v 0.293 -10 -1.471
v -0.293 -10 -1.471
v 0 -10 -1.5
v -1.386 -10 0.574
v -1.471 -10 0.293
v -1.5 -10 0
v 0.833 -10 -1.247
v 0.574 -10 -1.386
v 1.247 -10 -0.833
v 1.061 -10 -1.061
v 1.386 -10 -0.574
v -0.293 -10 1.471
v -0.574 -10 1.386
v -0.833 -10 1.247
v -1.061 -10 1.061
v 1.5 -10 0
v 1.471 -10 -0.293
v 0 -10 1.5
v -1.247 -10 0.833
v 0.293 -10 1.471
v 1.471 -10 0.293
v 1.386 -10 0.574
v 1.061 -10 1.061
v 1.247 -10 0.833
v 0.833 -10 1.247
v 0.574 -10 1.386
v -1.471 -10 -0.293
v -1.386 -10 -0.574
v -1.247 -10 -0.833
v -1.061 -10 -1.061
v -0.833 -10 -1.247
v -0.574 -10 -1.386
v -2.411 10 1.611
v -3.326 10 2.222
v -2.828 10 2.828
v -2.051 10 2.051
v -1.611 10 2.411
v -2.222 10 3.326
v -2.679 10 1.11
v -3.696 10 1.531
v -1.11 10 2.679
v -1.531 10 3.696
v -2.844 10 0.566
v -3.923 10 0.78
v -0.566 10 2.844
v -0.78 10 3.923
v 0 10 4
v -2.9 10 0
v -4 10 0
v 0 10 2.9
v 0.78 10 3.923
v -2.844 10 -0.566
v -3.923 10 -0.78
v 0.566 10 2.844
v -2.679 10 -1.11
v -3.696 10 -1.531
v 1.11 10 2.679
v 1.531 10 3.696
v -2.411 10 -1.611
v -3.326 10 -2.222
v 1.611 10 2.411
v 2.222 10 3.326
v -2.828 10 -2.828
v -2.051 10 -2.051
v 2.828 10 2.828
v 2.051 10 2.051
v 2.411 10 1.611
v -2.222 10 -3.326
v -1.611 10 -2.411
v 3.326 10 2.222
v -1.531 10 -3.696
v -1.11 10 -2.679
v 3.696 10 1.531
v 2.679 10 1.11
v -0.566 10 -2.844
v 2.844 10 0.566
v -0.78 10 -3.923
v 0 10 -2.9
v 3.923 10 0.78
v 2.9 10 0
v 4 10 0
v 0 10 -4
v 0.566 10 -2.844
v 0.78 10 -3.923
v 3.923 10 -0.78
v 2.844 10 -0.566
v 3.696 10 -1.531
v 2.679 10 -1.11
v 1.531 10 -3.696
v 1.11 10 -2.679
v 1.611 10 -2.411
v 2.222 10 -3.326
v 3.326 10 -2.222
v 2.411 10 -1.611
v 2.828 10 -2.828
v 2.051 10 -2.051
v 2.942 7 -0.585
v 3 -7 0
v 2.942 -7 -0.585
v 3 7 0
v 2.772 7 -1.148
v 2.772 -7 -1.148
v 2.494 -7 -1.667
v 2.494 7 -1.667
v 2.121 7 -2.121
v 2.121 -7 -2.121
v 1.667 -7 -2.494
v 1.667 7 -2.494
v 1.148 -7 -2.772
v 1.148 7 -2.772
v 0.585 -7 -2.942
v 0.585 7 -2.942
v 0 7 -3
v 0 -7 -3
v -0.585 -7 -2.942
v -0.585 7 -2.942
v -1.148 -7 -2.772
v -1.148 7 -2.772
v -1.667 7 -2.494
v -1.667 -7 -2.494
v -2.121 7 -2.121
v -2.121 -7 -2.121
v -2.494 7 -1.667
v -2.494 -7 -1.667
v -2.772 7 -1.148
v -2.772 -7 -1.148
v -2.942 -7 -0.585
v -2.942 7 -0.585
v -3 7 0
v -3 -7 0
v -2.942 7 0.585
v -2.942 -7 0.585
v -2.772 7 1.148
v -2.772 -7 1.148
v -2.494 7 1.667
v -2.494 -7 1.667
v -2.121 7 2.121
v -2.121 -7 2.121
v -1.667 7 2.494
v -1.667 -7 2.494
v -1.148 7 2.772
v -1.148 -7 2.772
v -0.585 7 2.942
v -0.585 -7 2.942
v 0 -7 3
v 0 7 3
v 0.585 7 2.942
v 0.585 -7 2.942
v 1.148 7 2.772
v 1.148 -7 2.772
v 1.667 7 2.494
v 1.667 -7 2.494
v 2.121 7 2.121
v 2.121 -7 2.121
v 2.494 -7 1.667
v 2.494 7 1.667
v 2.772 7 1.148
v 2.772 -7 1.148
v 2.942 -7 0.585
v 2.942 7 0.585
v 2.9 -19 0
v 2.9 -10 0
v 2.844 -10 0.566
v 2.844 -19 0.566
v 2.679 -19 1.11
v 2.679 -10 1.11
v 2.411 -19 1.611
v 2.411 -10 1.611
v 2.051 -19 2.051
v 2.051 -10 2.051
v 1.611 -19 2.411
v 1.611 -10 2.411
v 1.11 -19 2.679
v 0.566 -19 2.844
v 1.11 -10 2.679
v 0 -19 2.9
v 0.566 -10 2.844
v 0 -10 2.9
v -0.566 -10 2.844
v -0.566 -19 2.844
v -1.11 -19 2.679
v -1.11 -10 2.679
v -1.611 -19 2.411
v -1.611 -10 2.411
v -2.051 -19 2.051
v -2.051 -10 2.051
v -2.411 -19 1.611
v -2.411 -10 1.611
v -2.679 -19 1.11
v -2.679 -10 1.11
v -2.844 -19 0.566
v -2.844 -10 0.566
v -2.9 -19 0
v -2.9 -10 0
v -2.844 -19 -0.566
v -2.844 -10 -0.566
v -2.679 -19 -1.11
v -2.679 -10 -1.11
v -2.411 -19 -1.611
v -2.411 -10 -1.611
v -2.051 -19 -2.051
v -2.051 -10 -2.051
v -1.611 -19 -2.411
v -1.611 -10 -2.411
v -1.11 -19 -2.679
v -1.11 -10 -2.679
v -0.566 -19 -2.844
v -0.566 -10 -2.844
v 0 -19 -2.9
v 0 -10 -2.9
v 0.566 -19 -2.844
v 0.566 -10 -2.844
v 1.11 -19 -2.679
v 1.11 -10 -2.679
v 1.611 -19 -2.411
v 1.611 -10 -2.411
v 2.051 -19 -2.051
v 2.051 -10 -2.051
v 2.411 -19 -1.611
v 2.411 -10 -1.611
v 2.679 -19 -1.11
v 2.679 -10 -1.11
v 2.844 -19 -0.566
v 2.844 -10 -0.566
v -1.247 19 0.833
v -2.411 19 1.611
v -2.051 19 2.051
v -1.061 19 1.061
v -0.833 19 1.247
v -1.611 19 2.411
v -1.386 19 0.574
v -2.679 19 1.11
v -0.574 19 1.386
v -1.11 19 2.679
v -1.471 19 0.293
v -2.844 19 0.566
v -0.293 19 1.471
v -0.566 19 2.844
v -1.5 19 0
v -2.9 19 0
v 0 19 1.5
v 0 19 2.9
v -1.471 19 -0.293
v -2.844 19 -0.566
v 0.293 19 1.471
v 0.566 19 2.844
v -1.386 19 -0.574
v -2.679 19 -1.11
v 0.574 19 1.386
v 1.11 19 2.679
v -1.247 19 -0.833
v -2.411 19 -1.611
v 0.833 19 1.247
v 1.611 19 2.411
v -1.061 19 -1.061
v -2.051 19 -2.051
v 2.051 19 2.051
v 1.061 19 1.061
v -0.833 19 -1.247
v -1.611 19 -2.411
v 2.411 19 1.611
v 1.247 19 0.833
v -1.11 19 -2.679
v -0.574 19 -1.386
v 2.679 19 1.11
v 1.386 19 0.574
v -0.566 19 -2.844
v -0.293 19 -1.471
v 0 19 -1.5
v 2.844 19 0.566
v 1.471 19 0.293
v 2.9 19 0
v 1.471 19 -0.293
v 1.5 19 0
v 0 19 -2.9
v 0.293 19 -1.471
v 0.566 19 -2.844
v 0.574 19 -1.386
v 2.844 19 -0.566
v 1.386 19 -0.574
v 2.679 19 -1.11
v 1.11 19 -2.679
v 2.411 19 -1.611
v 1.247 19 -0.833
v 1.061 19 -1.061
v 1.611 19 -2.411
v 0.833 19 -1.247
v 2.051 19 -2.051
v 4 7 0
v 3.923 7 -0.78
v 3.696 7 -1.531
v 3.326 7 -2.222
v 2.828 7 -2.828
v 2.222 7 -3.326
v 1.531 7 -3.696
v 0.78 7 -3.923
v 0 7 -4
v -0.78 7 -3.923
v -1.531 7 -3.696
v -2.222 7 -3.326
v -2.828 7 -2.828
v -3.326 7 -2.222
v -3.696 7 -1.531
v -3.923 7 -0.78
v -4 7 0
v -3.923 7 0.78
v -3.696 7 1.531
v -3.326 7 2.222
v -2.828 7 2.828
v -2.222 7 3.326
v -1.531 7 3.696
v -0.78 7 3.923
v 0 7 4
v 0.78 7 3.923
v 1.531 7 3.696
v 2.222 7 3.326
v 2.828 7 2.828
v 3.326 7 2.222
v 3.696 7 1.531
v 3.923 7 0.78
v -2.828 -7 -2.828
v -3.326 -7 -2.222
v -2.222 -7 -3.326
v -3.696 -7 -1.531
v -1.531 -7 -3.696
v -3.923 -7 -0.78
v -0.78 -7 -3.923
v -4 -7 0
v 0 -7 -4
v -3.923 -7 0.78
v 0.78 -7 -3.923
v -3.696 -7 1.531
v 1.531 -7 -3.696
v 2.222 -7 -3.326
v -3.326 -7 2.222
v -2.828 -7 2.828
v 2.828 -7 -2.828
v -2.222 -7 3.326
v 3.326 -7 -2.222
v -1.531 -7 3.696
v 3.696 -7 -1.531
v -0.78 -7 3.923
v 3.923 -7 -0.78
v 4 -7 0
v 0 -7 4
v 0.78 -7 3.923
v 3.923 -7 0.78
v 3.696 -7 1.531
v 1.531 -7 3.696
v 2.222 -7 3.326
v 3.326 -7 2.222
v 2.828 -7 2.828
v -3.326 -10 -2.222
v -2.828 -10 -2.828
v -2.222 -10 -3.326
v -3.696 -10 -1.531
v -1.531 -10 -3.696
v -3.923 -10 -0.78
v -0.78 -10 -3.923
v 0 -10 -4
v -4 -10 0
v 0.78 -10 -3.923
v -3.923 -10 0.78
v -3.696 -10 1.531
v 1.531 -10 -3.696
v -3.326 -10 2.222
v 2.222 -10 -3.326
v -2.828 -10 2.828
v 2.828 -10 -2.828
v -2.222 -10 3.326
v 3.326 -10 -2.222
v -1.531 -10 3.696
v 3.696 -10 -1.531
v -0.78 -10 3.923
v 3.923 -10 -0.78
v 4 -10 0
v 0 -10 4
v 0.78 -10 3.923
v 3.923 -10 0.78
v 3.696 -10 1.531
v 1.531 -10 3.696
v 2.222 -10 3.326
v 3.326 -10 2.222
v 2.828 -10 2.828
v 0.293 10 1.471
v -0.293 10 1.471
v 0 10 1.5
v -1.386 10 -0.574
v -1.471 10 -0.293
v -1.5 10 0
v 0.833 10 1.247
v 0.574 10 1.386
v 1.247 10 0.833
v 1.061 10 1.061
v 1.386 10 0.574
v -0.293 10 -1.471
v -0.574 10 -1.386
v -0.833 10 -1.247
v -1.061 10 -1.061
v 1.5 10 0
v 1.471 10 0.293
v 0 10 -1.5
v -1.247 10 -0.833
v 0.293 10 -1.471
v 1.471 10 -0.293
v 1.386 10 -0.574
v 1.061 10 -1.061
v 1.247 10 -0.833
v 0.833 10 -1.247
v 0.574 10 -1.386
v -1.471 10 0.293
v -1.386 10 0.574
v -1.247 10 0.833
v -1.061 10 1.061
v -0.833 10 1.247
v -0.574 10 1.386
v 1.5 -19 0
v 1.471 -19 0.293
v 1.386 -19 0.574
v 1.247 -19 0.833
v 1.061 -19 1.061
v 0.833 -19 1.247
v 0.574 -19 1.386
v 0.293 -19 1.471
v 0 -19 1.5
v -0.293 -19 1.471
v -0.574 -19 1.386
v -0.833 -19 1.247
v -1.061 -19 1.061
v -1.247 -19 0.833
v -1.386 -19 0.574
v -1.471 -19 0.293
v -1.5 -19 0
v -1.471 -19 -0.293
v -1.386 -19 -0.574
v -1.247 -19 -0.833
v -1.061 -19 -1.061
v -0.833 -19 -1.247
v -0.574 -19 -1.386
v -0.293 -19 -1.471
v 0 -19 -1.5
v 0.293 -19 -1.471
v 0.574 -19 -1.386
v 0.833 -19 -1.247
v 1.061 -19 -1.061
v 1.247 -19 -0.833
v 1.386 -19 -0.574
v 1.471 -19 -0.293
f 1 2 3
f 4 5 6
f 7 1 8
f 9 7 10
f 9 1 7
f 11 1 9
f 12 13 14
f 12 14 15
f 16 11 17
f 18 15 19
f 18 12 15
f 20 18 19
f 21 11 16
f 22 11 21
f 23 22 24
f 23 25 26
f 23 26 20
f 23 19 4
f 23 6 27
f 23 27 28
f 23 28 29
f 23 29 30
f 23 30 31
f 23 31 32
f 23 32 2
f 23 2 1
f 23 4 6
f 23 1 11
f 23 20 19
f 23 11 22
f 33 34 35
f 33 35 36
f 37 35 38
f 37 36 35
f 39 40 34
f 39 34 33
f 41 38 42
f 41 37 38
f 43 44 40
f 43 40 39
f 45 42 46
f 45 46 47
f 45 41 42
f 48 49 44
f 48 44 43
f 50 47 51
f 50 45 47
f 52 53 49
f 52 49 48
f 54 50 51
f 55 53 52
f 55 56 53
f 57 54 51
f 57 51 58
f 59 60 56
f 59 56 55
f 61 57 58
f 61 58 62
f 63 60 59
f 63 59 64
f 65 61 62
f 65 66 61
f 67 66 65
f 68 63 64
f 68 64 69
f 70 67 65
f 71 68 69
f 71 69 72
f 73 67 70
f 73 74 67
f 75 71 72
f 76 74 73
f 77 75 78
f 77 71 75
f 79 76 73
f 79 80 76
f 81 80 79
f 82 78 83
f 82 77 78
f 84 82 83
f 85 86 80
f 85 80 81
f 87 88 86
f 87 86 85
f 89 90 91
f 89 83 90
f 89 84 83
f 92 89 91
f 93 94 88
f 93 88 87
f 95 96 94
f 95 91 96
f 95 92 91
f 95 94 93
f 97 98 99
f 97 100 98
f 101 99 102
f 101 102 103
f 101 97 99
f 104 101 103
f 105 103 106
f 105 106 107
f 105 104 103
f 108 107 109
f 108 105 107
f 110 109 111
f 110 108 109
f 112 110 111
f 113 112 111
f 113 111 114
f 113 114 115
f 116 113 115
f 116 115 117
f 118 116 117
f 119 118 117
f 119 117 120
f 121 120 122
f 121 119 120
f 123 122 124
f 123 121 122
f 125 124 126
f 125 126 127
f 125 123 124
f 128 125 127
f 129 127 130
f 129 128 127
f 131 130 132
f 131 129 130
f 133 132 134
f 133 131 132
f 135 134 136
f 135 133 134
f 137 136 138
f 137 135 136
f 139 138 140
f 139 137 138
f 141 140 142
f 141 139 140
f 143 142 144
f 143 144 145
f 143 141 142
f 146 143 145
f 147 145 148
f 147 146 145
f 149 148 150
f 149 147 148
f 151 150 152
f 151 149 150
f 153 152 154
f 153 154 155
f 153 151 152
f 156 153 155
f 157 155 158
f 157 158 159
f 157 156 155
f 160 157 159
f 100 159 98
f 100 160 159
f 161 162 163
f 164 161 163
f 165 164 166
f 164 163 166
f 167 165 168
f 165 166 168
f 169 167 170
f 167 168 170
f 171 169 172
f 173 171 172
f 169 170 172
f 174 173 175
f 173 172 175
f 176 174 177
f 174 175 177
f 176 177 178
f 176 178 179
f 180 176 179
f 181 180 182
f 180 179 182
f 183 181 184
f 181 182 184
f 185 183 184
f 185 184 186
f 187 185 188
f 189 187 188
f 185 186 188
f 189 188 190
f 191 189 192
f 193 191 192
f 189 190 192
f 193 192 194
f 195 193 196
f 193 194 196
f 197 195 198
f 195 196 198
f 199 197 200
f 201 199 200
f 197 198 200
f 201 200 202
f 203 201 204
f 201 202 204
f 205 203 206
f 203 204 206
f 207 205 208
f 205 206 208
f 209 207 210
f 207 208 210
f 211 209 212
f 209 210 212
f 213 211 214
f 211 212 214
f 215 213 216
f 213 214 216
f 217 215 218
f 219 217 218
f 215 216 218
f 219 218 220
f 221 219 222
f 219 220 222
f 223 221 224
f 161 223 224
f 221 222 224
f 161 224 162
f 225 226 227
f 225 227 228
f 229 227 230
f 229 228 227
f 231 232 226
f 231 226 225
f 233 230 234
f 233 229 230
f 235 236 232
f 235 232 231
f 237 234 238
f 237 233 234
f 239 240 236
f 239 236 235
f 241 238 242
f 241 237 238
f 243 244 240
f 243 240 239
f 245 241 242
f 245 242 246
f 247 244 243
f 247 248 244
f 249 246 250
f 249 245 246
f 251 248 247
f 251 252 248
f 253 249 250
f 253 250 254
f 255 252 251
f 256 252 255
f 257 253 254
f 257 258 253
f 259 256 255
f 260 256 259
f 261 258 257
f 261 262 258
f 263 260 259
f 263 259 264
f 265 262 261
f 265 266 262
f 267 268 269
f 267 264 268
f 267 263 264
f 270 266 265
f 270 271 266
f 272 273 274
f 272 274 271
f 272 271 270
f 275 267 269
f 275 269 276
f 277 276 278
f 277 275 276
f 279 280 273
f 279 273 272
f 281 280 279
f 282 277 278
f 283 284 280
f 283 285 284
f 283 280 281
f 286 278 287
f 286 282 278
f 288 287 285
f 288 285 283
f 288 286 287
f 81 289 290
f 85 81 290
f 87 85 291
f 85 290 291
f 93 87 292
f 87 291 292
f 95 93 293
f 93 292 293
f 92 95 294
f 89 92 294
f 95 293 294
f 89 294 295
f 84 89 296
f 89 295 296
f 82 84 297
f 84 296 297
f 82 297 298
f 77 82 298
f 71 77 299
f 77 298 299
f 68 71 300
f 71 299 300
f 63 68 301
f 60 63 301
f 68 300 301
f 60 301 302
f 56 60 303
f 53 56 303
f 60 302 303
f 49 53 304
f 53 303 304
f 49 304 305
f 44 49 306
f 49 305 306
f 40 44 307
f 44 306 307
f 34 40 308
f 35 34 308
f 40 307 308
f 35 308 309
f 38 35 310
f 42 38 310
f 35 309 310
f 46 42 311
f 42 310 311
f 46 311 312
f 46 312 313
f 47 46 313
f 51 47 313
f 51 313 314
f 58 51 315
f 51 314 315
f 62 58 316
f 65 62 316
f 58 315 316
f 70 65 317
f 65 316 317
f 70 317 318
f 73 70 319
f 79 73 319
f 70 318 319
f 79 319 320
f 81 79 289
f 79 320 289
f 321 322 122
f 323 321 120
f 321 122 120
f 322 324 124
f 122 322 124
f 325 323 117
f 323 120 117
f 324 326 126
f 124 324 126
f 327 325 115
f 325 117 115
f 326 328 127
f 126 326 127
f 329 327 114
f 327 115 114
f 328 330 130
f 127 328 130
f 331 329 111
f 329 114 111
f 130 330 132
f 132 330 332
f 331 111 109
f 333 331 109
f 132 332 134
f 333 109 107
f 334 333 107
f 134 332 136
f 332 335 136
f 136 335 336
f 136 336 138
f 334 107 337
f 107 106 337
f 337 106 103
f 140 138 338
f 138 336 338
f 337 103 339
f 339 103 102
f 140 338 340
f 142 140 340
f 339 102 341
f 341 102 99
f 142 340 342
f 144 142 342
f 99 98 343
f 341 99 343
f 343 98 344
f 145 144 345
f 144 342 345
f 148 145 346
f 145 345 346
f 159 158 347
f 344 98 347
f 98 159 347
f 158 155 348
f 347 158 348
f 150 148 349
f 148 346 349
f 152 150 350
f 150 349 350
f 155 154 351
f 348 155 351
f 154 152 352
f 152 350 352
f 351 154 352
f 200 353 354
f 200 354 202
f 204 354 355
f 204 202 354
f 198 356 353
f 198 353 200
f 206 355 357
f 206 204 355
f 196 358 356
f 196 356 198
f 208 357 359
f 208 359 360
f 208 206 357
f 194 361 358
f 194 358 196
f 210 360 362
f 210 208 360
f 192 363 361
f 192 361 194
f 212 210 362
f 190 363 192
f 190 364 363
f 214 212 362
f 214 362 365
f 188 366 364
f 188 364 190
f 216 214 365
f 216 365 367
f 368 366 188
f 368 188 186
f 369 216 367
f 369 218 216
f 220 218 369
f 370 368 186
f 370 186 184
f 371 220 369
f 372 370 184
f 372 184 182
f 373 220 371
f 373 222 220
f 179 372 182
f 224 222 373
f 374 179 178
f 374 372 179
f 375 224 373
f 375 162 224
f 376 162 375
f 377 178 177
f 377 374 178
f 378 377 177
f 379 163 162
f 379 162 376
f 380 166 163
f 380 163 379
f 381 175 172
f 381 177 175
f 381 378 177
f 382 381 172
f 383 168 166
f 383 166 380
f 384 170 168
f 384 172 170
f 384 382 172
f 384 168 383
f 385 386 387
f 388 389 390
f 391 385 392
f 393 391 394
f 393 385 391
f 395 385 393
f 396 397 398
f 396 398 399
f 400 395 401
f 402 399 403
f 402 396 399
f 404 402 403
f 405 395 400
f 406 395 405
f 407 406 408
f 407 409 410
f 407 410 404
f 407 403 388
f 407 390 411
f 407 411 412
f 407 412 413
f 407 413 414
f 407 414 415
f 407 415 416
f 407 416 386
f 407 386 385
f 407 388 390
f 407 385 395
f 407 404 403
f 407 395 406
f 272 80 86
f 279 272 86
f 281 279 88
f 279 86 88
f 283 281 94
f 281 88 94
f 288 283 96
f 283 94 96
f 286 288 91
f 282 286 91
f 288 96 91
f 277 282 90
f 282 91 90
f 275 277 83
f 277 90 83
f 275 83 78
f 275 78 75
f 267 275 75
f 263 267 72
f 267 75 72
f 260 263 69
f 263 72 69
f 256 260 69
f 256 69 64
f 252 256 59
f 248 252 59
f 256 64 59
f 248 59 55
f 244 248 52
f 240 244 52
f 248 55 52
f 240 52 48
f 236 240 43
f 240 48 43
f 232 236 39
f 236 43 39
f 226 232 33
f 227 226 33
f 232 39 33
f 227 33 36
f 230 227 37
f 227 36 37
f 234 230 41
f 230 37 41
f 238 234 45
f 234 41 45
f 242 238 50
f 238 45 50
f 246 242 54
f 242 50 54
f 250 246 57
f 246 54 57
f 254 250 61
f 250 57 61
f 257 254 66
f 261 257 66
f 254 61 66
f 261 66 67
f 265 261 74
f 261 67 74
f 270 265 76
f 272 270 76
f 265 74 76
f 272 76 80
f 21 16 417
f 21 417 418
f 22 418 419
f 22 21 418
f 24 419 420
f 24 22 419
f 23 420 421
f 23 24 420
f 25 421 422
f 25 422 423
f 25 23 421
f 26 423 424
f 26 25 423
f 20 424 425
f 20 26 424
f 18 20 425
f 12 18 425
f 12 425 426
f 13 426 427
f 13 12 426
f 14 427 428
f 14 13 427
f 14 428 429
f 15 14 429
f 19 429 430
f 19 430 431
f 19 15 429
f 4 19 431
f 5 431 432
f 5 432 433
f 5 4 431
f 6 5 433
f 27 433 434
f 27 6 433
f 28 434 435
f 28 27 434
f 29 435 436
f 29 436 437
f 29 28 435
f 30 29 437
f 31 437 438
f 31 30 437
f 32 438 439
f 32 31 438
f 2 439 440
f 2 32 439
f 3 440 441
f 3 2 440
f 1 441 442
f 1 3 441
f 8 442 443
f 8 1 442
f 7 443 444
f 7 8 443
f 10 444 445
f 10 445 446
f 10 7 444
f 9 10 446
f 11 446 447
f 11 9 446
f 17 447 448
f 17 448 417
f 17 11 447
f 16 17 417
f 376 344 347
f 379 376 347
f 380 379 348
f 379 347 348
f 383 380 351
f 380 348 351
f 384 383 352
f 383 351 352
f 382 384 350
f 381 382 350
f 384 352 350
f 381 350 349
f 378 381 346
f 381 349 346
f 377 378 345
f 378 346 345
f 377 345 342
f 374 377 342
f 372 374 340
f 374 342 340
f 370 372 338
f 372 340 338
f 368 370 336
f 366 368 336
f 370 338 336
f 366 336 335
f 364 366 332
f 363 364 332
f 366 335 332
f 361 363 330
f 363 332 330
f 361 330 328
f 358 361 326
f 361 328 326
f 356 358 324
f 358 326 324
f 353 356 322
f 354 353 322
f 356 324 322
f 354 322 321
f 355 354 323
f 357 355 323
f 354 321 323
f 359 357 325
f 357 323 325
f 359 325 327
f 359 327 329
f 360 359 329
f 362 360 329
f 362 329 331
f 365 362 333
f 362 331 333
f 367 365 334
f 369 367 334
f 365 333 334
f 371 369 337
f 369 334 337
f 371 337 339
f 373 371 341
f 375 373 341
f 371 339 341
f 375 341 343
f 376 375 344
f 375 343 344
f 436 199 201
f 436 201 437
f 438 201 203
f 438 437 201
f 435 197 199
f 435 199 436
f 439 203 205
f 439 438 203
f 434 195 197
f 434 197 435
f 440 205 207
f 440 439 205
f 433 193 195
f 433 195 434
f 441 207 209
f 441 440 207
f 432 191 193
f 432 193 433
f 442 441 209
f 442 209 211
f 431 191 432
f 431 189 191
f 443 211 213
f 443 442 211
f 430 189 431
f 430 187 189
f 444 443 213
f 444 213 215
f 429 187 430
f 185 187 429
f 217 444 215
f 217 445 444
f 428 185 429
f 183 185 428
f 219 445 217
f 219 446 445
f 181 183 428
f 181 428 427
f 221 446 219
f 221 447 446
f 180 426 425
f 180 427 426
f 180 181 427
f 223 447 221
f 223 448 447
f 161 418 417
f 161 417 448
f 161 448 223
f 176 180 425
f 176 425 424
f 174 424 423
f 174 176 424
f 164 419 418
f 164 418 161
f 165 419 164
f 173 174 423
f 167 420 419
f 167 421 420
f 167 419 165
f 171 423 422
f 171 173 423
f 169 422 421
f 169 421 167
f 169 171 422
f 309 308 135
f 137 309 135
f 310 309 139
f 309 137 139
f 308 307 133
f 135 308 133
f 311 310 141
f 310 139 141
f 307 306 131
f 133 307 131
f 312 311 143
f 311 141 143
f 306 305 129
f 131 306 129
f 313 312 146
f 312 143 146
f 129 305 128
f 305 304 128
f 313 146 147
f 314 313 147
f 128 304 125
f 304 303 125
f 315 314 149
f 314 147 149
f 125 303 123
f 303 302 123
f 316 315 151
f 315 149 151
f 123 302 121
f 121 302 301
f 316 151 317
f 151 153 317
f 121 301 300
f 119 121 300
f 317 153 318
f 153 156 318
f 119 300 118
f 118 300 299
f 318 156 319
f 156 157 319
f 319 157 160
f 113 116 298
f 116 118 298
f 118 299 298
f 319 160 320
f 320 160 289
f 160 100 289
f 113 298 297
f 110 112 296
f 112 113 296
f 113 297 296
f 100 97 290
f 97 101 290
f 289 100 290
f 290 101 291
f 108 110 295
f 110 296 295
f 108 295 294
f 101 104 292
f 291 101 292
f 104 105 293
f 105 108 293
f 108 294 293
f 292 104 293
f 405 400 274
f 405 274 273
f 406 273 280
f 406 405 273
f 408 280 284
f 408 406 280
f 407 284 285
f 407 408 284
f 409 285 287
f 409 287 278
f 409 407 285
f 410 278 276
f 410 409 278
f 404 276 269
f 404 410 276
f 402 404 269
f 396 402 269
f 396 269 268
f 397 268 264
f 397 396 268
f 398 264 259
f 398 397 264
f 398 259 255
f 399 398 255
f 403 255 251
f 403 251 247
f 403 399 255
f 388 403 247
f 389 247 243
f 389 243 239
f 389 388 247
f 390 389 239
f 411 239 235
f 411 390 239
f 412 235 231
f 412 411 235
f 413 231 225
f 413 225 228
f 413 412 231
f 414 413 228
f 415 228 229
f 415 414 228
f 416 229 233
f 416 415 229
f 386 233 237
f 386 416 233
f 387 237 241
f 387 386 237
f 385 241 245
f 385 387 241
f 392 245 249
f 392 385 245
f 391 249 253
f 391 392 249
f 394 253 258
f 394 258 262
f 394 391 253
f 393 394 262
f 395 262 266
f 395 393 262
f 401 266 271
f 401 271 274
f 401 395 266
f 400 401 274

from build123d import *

# Parameters (mm, degrees)
SKETCH1_R           = 3
BOSS_EXTRUDE1_DEPTH = 7
SKETCH2_R           = 4
BOSS_EXTRUDE2_DEPTH = 3
SKETCH3_R           = 4
BOSS_EXTRUDE3_DEPTH = 3
SKETCH4_R           = 2.9
SKETCH4_R_2         = 1.5
BOSS_EXTRUDE5_DEPTH = 9
SKETCH5_R           = 2.9
SKETCH5_R_2         = 1.5
BOSS_EXTRUDE6_DEPTH = 9


with BuildPart() as part:
    # Sketch1 → Boss-Extrude1 (new body, symmetric)
    with BuildSketch(Plane(origin=(0, 0, 0), x_dir=(1, 0, 0), z_dir=(0, 1, 0))):
        Circle(SKETCH1_R)
    extrude(amount=BOSS_EXTRUDE1_DEPTH, both=True)

    # Sketch2 → Boss-Extrude2 (add)
    with BuildSketch(Plane.XZ.offset(7)):
        Circle(SKETCH2_R)
    extrude(amount=BOSS_EXTRUDE2_DEPTH)

    # Sketch3 → Boss-Extrude3 (add)
    with BuildSketch(Plane(origin=(0, 7, 0), x_dir=(1, 0, 0), z_dir=(0, 1, 0))):
        Circle(SKETCH3_R)
    extrude(amount=BOSS_EXTRUDE3_DEPTH)

    # Sketch4 → Boss-Extrude5 (add)
    with BuildSketch(Plane.XZ.offset(10)):
        Circle(SKETCH4_R)
        Circle(SKETCH4_R_2, mode=Mode.SUBTRACT)
    extrude(amount=BOSS_EXTRUDE5_DEPTH)

    # Sketch5 → Boss-Extrude6 (add)
    with BuildSketch(Plane(origin=(0, 10, 0), x_dir=(1, 0, 0), z_dir=(0, 1, 0))):
        Circle(SKETCH5_R)
        Circle(SKETCH5_R_2, mode=Mode.SUBTRACT)
    extrude(amount=BOSS_EXTRUDE6_DEPTH)


solid = part.part
